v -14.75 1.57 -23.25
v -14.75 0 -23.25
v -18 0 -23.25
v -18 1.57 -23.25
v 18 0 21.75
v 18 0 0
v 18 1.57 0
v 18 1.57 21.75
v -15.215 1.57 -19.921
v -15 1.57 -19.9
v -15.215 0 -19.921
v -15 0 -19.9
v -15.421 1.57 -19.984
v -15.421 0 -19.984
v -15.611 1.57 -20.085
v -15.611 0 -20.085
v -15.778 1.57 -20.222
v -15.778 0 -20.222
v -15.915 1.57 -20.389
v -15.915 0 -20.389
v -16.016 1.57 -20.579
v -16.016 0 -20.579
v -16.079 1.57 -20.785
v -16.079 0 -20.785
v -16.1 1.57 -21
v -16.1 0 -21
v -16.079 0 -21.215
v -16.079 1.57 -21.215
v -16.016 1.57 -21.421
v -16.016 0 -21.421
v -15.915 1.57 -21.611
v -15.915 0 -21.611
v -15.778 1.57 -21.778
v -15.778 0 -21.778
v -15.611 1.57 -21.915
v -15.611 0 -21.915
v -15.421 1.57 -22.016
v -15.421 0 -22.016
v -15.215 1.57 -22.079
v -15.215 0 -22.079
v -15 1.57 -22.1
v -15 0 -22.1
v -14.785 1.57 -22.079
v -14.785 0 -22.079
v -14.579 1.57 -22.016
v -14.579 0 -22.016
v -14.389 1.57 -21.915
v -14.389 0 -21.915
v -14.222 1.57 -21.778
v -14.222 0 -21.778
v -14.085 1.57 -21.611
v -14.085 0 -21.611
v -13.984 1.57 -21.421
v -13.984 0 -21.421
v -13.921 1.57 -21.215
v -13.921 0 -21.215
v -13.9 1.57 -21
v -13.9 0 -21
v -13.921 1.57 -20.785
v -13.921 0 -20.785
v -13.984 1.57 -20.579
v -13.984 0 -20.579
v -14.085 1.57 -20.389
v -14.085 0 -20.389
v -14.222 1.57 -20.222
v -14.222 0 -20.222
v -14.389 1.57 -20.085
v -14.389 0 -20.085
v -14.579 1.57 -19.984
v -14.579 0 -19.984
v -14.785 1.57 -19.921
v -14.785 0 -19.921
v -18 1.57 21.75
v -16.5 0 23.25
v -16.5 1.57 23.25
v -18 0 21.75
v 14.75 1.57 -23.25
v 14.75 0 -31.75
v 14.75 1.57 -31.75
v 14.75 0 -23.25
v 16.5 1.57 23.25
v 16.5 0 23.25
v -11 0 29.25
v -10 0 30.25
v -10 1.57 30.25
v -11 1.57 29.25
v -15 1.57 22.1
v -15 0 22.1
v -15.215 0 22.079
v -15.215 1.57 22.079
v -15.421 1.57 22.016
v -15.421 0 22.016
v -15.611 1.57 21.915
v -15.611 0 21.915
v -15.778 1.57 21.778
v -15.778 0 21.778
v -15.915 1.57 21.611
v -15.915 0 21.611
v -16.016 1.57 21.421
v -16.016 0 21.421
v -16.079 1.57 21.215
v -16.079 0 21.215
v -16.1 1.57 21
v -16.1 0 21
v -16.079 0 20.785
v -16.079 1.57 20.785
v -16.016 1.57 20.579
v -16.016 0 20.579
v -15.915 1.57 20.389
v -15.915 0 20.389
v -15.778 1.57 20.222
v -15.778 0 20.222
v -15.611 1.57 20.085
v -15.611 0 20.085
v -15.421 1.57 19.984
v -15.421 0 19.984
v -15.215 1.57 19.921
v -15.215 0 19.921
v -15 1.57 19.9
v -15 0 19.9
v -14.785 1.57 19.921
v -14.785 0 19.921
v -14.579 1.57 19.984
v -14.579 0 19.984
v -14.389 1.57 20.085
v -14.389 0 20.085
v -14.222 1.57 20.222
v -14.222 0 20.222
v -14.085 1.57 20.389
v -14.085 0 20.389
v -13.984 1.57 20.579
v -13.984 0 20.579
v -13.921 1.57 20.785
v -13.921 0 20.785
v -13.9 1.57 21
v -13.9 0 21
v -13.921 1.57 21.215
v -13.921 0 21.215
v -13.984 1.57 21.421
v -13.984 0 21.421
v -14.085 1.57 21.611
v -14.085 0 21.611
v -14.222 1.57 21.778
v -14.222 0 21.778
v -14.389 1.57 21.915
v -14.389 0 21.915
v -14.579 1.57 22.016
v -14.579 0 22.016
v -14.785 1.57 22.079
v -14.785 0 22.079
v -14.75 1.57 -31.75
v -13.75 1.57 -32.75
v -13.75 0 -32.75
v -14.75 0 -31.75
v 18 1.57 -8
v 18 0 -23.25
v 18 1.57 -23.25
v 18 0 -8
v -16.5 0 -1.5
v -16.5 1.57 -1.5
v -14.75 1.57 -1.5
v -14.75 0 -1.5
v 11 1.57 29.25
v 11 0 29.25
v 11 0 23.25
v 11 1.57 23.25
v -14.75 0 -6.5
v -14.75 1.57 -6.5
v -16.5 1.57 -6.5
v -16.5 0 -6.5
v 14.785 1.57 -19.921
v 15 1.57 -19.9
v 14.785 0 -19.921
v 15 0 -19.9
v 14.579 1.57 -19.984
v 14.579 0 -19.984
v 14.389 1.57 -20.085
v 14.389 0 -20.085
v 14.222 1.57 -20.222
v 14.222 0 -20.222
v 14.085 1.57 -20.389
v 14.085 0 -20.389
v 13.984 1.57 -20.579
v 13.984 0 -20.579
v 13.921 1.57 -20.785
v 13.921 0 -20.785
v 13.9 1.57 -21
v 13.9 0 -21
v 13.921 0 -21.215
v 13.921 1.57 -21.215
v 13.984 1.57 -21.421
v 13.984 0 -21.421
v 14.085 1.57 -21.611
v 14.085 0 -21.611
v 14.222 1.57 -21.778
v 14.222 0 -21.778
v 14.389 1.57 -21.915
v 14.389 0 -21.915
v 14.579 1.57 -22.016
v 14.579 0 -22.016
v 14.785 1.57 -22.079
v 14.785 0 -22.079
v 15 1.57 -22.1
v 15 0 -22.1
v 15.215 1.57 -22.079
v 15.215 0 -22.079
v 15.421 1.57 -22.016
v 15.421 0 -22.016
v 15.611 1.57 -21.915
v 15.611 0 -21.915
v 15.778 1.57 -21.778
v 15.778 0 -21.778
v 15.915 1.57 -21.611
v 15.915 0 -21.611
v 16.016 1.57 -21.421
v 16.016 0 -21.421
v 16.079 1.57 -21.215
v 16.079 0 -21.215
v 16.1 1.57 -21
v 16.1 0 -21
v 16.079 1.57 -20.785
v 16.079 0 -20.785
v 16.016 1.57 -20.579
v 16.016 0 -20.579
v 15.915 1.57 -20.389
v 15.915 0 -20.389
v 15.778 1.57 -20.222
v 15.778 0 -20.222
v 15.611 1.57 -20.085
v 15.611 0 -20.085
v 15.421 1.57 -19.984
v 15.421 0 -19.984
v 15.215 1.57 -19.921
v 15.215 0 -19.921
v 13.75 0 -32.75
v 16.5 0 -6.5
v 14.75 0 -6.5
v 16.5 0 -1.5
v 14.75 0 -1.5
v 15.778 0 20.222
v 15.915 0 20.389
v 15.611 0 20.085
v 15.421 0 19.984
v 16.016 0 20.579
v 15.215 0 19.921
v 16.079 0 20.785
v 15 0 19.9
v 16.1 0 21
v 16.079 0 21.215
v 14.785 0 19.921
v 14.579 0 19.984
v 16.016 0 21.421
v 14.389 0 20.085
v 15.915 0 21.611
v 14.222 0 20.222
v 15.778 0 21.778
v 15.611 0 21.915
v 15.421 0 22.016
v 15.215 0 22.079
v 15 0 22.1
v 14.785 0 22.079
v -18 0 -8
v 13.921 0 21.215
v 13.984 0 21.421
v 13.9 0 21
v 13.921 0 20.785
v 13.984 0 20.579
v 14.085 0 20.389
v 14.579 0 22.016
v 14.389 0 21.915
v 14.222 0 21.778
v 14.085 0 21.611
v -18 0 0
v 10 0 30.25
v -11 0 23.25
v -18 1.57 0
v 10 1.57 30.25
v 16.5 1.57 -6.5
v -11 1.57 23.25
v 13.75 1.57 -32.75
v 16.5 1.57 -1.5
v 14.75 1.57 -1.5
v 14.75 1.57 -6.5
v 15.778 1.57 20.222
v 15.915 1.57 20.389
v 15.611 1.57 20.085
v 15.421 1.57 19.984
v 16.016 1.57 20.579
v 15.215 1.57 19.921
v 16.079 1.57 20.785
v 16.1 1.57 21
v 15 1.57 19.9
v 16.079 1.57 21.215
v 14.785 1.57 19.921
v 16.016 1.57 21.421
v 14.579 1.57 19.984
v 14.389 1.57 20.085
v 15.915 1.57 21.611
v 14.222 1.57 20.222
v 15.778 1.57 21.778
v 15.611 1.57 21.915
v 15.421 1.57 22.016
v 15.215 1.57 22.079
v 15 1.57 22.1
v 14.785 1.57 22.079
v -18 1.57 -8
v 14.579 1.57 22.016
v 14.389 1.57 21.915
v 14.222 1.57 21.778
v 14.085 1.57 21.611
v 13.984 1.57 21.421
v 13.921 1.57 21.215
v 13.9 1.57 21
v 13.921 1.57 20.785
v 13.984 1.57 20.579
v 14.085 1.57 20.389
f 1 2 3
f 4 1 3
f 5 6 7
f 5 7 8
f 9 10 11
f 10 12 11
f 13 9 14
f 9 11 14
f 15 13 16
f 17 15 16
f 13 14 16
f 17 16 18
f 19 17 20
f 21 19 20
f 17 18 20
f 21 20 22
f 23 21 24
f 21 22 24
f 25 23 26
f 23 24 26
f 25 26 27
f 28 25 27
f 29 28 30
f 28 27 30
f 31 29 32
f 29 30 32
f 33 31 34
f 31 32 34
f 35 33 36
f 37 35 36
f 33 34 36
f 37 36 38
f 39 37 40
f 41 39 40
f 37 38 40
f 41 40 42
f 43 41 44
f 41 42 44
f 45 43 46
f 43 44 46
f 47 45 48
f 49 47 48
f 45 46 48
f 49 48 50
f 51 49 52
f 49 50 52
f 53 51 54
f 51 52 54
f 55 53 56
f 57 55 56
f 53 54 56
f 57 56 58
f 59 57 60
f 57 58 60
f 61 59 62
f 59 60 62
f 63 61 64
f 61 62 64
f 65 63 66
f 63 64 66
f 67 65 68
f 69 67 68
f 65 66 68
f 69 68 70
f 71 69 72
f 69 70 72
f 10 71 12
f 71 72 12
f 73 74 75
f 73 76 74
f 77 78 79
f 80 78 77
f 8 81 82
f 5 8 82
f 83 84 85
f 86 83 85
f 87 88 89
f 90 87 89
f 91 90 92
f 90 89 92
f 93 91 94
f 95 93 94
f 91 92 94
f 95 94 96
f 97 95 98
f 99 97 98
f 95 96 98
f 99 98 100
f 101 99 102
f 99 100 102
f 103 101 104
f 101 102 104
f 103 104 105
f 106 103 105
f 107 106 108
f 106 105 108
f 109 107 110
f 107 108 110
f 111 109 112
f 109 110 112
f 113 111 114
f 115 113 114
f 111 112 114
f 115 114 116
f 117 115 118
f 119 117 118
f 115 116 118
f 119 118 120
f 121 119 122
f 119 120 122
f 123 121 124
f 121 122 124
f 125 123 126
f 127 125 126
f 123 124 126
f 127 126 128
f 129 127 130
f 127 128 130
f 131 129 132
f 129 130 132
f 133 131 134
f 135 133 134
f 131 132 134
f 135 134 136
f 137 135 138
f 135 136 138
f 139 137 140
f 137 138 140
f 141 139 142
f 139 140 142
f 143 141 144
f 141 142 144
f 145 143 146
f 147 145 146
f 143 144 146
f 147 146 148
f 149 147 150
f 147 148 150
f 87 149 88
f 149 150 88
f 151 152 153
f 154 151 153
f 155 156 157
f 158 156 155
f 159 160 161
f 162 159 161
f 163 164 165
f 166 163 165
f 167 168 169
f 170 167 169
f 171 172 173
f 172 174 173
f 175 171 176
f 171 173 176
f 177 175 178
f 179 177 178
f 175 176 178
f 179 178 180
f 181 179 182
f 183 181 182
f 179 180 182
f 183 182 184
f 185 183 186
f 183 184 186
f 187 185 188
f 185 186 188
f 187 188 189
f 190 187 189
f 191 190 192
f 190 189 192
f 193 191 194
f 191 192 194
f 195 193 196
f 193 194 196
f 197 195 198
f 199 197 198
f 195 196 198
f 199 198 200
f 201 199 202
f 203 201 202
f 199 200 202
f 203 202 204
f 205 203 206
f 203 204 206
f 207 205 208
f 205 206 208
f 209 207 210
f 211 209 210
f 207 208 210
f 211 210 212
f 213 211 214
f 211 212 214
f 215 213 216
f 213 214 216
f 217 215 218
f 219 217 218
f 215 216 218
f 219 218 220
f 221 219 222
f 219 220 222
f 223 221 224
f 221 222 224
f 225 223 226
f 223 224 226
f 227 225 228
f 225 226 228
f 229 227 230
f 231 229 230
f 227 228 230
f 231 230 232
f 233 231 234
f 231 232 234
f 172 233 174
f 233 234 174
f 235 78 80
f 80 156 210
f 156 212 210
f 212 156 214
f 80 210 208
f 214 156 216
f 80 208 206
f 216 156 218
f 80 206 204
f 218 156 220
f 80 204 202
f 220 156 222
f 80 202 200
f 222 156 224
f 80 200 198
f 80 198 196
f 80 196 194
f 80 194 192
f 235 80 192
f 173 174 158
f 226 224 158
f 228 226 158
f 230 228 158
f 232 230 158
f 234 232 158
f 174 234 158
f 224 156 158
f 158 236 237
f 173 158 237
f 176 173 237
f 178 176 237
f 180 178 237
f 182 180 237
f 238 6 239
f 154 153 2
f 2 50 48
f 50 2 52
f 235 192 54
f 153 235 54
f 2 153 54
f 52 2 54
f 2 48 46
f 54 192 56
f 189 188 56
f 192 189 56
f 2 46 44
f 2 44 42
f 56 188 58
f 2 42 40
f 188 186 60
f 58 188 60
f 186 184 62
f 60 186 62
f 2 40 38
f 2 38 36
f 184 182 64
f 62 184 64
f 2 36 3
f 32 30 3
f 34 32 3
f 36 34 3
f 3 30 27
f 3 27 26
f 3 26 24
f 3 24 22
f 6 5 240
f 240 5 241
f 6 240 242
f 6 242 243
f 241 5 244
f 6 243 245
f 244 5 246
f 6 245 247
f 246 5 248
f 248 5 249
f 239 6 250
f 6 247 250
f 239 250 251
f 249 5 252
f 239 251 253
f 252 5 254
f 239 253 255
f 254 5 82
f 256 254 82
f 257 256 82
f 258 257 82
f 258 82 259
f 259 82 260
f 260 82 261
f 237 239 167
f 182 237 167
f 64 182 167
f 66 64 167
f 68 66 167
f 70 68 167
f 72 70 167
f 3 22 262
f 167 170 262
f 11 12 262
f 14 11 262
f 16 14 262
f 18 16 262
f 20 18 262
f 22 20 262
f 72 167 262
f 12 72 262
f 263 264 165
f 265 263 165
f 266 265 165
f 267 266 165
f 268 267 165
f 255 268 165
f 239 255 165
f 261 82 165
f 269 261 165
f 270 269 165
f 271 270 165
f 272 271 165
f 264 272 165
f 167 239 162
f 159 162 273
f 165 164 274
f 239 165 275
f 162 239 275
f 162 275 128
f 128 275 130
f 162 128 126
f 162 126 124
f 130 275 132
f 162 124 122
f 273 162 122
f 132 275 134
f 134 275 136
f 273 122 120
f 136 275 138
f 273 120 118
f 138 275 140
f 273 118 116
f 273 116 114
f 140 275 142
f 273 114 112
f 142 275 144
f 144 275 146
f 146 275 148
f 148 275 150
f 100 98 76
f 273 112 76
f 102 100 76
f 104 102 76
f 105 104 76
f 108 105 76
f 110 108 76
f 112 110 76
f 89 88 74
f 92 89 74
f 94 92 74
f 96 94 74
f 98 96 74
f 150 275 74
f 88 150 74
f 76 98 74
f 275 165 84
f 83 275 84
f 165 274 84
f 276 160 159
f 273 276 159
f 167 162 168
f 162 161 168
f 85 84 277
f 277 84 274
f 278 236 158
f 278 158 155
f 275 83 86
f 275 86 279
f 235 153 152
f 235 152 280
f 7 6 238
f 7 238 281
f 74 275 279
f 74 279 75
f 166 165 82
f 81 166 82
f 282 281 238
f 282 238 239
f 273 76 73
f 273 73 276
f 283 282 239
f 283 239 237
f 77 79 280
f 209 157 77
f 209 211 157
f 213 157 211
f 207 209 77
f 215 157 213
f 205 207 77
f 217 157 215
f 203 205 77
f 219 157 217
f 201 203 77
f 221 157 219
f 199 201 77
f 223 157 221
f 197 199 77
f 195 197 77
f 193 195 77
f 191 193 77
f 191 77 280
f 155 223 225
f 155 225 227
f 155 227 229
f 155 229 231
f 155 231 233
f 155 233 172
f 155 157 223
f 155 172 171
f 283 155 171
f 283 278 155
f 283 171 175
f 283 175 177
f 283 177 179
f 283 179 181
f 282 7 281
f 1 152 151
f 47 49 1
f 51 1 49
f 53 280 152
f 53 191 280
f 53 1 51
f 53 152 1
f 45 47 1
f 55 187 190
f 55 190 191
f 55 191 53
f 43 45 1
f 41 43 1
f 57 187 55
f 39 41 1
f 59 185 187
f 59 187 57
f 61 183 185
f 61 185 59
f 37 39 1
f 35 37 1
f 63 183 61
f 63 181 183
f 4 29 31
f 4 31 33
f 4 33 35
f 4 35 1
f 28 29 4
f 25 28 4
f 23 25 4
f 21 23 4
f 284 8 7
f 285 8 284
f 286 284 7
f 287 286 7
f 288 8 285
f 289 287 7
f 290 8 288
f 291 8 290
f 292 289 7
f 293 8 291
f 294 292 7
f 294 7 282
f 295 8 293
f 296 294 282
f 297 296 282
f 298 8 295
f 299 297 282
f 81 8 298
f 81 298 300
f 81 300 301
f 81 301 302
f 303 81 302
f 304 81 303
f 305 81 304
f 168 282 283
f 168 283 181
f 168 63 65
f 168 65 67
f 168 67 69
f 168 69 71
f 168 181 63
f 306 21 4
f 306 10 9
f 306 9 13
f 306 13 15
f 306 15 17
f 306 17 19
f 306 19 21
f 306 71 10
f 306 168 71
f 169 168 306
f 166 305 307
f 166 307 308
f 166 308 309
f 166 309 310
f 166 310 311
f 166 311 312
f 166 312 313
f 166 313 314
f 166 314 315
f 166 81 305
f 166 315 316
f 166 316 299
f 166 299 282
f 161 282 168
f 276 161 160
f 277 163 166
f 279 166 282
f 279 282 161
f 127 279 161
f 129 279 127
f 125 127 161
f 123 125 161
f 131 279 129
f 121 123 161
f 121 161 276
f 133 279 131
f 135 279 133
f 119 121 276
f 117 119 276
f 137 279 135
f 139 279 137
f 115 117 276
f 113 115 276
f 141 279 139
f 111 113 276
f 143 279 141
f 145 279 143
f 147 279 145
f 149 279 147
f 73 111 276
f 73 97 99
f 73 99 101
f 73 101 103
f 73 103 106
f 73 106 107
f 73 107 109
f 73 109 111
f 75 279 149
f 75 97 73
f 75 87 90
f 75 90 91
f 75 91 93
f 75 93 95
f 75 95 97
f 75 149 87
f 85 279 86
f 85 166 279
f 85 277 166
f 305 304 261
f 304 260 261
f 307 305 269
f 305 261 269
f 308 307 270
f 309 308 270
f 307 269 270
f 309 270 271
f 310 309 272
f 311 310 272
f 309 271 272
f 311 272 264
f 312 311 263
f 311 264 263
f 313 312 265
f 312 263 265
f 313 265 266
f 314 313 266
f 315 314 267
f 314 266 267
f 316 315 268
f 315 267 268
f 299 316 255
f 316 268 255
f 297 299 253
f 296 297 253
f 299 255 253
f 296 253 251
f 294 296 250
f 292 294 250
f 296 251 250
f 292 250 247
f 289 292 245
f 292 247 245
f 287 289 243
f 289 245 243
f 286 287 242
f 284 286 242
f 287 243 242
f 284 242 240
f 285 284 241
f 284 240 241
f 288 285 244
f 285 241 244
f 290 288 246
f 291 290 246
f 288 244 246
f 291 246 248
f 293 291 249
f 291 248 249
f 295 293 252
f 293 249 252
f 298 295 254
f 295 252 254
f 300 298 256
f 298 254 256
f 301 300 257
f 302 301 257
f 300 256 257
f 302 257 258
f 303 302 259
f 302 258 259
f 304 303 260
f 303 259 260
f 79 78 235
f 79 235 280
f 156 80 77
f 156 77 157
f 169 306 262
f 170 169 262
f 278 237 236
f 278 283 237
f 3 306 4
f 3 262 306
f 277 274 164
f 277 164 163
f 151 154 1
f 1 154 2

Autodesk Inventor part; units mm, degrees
ref_plane "YZ Plane" through (0, 0, 0) normal (1, 0, 0) x (0, 1, 0)
ref_plane "XZ Plane" through (0, 0, 0) normal (0, 1, 0) x (-1, 0, 0)
ref_plane "XY Plane" through (0, 0, 0) normal (0, 0, 1) x (1, 0, 0)
sketch "Sketch1" plane through (0, 0, 0) normal (0, 1, 0) x (-1, 0, 0)
  line L0 (18, 30.25) -> (-18, 30.25) construction
  line L1 (-18, 30.25) -> (-18, -32.75) construction
  line L2 (-18, -32.75) -> (18, -32.75) construction
  line L3 (18, -32.75) -> (18, 30.25) construction
  line L4 (11, 30.25) -> (-11, 30.25)
  line L5 (11, 30.25) -> (11, 23.25)
  line L6 (11, 23.25) -> (18, 23.25)
  line L7 (14.75, -32.75) -> (-14.75, -32.75)
  line L8 (14.75, -32.75) -> (14.75, -23.25)
  line L9 (14.75, -23.25) -> (18, -23.25)
  line L10 (14.75, 0) -> (18, 0)
  line L11 (-11, 30.25) -> (-11, 23.25)
  line L12 (-11, 23.25) -> (-18, 23.25)
  line L13 (-14.75, -32.75) -> (-14.75, -23.25)
  line L14 (-14.75, -23.25) -> (-18, -23.25)
  line L15 (18, 23.25) -> (18, -23.25)
  line L16 (-18, -23.25) -> (-18, 23.25)
  point P0 (0, 0)
  point P1 (0, 30.25)
  point P2 (0, -32.75)
  point P3 (-18, -6.9939)
  point P4 (18, 0)
  dimension "d0" = 36
  dimension "d1" = 63
  dimension "d2" = 22
  dimension "d3" = 7
  dimension "d4" = 29.5
  dimension "d5" = 9.5
  dimension "d10" = 7
  dimension "d11" = 9.5
extrude "Extrusion1" add sketch "Sketch1" along normal blind 1.57
chamfer "Chamfer2" distance 1 angle 45 4 edges at (11, 0.785, 30.25) (-11, 0.785, 30.25) (14.75, 0.785, -32.75) (-14.75, 0.785, -32.75)
sketch "Sketch2" plane through (0, 1.57, 0) normal (0, 1, 0) x (1, 0, 0)
  line L0 (-18, -23.25) -> (-11, -23.25) projected
  line L1 (-18, 23.25) -> (-18, -23.25) projected
  point P0 (0, 0)
  point P1 (15, -21)
  point P2 (15, 21)
  point P3 (-15, -21)
  point P4 (-15, 21)
  dimension "d20" = 42
  dimension "d21" = 42
  dimension "d22" = 30
  dimension "d28" = 2.25
  dimension "d36" = 3
hole "Hole1" at (15, 1.57, 21) at (15, 1.57, -21) at (-15, 1.57, 21) at (-15, 1.57, -21) direction (0, -1, 0) diameter 2.2 end through all clearance for "Flat Head Machine Screw" size "M2" standard "Ansi Metric M Profile"
sketch "Sketch3" plane through (0, 1.57, 0) normal (0, 1, 0) x (1, 0, 0)
  line L0 (-18, 1.5) -> (-14.75, 1.5)
  line L1 (-14.75, 1.5) -> (-14.75, 6.5)
  line L2 (-14.75, 6.5) -> (-18, 6.5)
  line L3 (-18, 23.25) -> (-18, -23.25) projected
  circle A0 centre (-15, 21) radius 1.1 projected
  line L4 (0, 0) -> (0, 8.9759) construction
  line L5 (18, 1.5) -> (14.75, 1.5)
  line L6 (14.75, 1.5) -> (14.75, 6.5)
  line L7 (14.75, 6.5) -> (18, 6.5)
  line L8 (18, 23.25) -> (18, -21.75)
  point P0 (-18, -21.75)
  point P1 (-14.75, 4)
  dimension "d37" = 5
  dimension "d38" = 3.25
  dimension "d39" = 3.25
  dimension "d40" = 17
extrude "Extrusion2" cut sketch "Sketch3" against normal through all contours L3 L2 L1 L0 | L5 L6 L7 L8
chamfer "Chamfer3" distance 1.5 angle 45 6 edges at (-18, 0.785, 23.25) (18, 0.785, 23.25) (18, 0.785, -1.5) (18, 0.785, -6.5) (-18, 0.785, -1.5) (-18, 0.785, -6.5)
equation "\"d21\" = d20"
equation "\"d39\" = d38"
properties part number "LFRboard"
